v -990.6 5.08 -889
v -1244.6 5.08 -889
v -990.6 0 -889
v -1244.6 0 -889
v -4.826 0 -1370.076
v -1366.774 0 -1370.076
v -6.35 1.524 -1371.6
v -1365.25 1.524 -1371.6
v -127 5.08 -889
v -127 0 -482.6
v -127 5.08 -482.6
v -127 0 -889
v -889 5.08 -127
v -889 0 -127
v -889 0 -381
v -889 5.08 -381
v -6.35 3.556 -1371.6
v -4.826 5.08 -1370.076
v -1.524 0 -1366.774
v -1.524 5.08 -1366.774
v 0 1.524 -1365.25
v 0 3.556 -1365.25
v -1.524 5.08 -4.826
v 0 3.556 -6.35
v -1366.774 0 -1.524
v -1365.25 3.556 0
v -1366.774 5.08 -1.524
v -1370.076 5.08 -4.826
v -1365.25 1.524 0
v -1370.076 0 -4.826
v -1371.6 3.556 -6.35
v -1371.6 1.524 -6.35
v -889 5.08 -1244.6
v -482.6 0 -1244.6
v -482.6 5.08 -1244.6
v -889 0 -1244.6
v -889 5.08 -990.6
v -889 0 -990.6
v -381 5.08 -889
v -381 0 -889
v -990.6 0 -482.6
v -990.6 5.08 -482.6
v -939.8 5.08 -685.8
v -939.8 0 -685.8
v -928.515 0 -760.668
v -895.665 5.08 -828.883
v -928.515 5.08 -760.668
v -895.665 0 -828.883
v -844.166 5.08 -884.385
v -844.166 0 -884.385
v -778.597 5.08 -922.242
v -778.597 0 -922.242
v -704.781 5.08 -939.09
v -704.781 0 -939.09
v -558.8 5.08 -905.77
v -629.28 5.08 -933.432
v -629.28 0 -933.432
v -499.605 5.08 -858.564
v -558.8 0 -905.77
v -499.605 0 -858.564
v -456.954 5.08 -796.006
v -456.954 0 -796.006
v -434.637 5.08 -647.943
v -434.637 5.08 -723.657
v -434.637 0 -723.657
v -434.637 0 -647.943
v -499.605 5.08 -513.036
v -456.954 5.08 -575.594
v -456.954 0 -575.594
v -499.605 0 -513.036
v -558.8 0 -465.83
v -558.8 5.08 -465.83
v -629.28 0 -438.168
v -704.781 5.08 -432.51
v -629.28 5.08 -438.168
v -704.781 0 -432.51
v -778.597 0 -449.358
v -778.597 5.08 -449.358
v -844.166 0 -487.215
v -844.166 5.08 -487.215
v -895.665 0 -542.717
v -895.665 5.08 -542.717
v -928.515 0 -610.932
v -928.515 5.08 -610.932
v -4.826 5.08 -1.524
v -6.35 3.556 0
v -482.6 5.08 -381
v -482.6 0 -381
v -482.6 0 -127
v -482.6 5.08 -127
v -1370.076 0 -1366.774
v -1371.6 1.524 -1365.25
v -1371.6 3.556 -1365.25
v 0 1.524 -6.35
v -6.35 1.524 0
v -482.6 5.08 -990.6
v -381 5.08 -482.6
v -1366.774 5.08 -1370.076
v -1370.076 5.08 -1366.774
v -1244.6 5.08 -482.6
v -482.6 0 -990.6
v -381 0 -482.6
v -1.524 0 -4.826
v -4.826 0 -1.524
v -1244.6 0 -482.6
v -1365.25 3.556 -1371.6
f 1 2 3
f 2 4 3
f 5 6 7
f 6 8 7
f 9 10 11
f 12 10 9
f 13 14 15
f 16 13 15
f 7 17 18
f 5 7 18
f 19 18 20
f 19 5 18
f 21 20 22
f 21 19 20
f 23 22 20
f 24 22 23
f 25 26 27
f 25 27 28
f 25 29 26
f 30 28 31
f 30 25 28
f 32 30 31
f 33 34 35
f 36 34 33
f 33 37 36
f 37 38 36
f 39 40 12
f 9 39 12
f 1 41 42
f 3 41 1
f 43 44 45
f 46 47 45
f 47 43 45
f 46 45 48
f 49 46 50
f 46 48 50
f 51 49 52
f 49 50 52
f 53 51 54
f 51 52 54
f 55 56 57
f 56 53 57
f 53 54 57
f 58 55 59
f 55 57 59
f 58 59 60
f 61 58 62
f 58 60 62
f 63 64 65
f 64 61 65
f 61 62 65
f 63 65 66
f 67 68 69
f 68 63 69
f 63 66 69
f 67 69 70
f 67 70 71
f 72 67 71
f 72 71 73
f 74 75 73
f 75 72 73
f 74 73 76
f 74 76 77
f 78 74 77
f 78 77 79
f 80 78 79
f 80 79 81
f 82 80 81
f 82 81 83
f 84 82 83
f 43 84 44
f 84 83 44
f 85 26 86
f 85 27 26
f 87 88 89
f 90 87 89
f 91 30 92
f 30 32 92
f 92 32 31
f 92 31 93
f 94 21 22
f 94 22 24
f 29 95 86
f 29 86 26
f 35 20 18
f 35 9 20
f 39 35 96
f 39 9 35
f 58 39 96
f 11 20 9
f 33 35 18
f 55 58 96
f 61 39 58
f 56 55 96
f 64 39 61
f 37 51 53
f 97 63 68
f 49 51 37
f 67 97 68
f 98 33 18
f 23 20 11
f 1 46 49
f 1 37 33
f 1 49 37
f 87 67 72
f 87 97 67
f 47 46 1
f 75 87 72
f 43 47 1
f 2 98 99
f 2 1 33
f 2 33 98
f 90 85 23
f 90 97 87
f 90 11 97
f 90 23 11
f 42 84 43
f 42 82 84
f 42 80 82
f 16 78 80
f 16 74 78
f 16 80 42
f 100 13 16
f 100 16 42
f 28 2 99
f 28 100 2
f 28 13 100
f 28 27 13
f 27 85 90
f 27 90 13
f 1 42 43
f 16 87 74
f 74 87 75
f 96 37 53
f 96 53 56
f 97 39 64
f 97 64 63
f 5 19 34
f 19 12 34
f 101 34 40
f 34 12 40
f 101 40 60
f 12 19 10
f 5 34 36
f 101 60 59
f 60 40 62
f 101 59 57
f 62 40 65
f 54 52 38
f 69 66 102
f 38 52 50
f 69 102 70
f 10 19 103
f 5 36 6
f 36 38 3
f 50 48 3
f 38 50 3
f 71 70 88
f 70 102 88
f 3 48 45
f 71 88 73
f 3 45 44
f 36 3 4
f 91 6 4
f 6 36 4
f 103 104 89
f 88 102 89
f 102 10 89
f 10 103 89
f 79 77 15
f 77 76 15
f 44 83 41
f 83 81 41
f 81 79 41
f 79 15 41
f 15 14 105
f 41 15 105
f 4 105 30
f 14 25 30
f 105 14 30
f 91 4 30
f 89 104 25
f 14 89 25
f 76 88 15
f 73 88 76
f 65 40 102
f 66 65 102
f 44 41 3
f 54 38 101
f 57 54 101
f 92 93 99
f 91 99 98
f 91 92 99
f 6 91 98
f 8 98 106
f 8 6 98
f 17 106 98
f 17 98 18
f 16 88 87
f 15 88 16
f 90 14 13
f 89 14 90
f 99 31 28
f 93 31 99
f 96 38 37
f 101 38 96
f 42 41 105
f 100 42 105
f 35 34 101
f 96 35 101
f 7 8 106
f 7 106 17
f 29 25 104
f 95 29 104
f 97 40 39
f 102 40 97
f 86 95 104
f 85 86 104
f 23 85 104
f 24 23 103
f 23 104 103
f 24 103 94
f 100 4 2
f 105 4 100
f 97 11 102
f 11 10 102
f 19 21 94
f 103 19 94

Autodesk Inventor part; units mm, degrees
ref_plane "YZ Plane" through (0, 0, 0) normal (1, 0, 0) x (0, 1, 0)
ref_plane "XZ Plane" through (0, 0, 0) normal (0, 1, 0) x (-1, 0, 0)
ref_plane "XY Plane" through (0, 0, 0) normal (0, 0, 1) x (1, 0, 0)
sketch "Sketch1" plane through (0, 0, 0) normal (0, 1, 0) x (-1, 0, 0)
  line L0 (6.35, 0) -> (1365.25, 0)
  line L1 (1371.6, -6.35) -> (1371.6, -1365.25)
  line L2 (1365.25, -1371.6) -> (6.35, -1371.6)
  line L3 (0, -1365.25) -> (0, -6.35)
  line L4 (1346.2, -1346.2) -> (1346.2, -25.4)
  line L5 (1346.2, -25.4) -> (25.4, -25.4)
  line L6 (25.4, -25.4) -> (25.4, -1346.2)
  line L7 (25.4, -1346.2) -> (1346.2, -1346.2)
  line L8 (1320.8, -50.8) -> (1320.8, -1320.8)
  line L9 (1320.8, -1320.8) -> (50.8, -1320.8)
  line L10 (50.8, -1320.8) -> (50.8, -50.8)
  line L11 (50.8, -50.8) -> (1320.8, -50.8)
  line L12 (1320.8, -50.8) -> (1346.2, -25.4)
  line L13 (1320.8, -1320.8) -> (1346.2, -1346.2)
  line L14 (50.8, -1320.8) -> (25.4, -1346.2)
  line L15 (50.8, -50.8) -> (25.4, -25.4)
  line L16 (1219.2, -482.6) -> (1016, -482.6)
  line L17 (1016, -482.6) -> (1016, -889)
  line L18 (1016, -889) -> (1219.2, -889)
  line L19 (1219.2, -889) -> (1219.2, -482.6)
  line L20 (355.6, -482.6) -> (152.4, -482.6)
  line L21 (152.4, -482.6) -> (152.4, -889)
  line L22 (152.4, -889) -> (355.6, -889)
  line L23 (355.6, -889) -> (355.6, -482.6)
  line L24 (889, -1016) -> (482.6, -1016)
  line L25 (482.6, -1016) -> (482.6, -1219.2)
  line L26 (482.6, -1219.2) -> (889, -1219.2)
  line L27 (889, -1219.2) -> (889, -1016)
  line L28 (889, -152.4) -> (482.6, -152.4)
  line L29 (482.6, -152.4) -> (482.6, -355.6)
  line L30 (482.6, -355.6) -> (889, -355.6)
  line L31 (889, -355.6) -> (889, -152.4)
  circle A0 centre (685.8, -685.8) radius 254
  line L32 (889, -127) -> (482.6, -127)
  line L33 (457.2, -127) -> (457.2, -381)
  line L34 (457.2, -381) -> (914.4, -381)
  line L35 (914.4, -381) -> (914.4, -127)
  line L36 (1244.6, -457.2) -> (990.6, -457.2)
  line L37 (990.6, -457.2) -> (990.6, -914.4)
  line L38 (990.6, -914.4) -> (1244.6, -914.4)
  line L39 (1244.6, -889) -> (1244.6, -482.6)
  line L40 (914.4, -990.6) -> (457.2, -990.6)
  line L41 (457.2, -990.6) -> (457.2, -1244.6)
  line L42 (482.6, -1244.6) -> (889, -1244.6)
  line L43 (914.4, -1244.6) -> (914.4, -990.6)
  line L44 (381, -457.2) -> (127, -457.2)
  line L45 (127, -482.6) -> (127, -889)
  line L46 (127, -914.4) -> (381, -914.4)
  line L47 (381, -914.4) -> (381, -457.2)
  line L48 (152.4, -482.6) -> (50.8, -482.6)
  line L49 (127, -457.2) -> (50.8, -457.2)
  line L50 (152.4, -889) -> (50.8, -889)
  line L51 (127, -914.4) -> (50.8, -914.4)
  line L52 (355.6, -889) -> (381, -889)
  line L53 (355.6, -482.6) -> (381, -482.6)
  line L54 (457.2, -1244.6) -> (457.2, -1320.8)
  line L55 (482.6, -1219.2) -> (482.6, -1320.8)
  line L56 (889, -1219.2) -> (889, -1320.8)
  line L57 (914.4, -1244.6) -> (914.4, -1320.8)
  line L58 (1244.6, -914.4) -> (1320.8, -914.4)
  line L59 (1219.2, -889) -> (1320.8, -889)
  line L60 (1219.2, -482.6) -> (1320.8, -482.6)
  line L61 (1244.6, -457.2) -> (1320.8, -457.2)
  line L62 (889, -152.4) -> (889, -50.8)
  line L63 (914.4, -127) -> (914.4, -50.8)
  line L64 (482.6, -152.4) -> (482.6, -50.8)
  line L65 (457.2, -127) -> (457.2, -50.8)
  line L66 (889, -1016) -> (889, -990.6)
  line L67 (482.6, -1016) -> (482.6, -990.6)
  line L68 (1016, -889) -> (990.6, -889)
  line L69 (1016, -482.6) -> (990.6, -482.6)
  line L70 (889, -355.6) -> (889, -381)
  line L71 (482.6, -355.6) -> (482.6, -381)
  line L72 (914.4, -381) -> (990.6, -457.2)
  line L73 (990.6, -482.6) -> (889, -381)
  line L74 (990.6, -914.4) -> (914.4, -990.6)
  line L75 (889, -990.6) -> (990.6, -889)
  line L76 (381, -914.4) -> (457.2, -990.6)
  line L77 (482.6, -990.6) -> (381, -889)
  line L78 (457.2, -381) -> (381, -457.2)
  line L79 (482.6, -381) -> (381, -482.6)
  line L80 (1257.3, -50.8) -> (1320.8, -114.3)
  line L81 (1320.8, -1257.3) -> (1257.3, -1320.8)
  line L82 (50.8, -1257.3) -> (114.3, -1320.8)
  line L83 (50.8, -114.3) -> (114.3, -50.8)
  line L84 (68.7605, -132.2605) -> (132.2605, -68.7605)
  line L85 (68.7605, -1239.3395) -> (132.2605, -1302.8395)
  line L86 (1302.8395, -1239.3395) -> (1239.3395, -1302.8395)
  line L87 (1239.3395, -68.7605) -> (1302.8395, -132.2605)
  line L88 (1302.8395, -132.2605) -> (1320.8, -150.221)
  line L89 (1239.3395, -68.7605) -> (1221.379, -50.8)
  line L90 (1302.8395, -1239.3395) -> (1320.8, -1221.379)
  line L91 (1239.3395, -1302.8395) -> (1221.379, -1320.8)
  line L92 (132.2605, -1302.8395) -> (150.221, -1320.8)
  line L93 (68.7605, -1239.3395) -> (50.8, -1221.379)
  line L94 (132.2605, -68.7605) -> (150.221, -50.8)
  line L95 (68.7605, -132.2605) -> (50.8, -150.221)
  line L96 (1365.25, 0) -> (1371.6, -6.35)
  line L97 (1371.6, -1365.25) -> (1365.25, -1371.6)
  line L98 (6.35, -1371.6) -> (0, -1365.25)
  line L99 (6.35, 0) -> (0, -6.35)
  point P0 (0, 0)
  point P1 (1371.6, -1371.6)
  point P2 (1371.6, 0)
  point P3 (0, -1371.6)
  dimension "d0" = 1371.6
  dimension "d1" = 1371.6
  dimension "d2" = 25.4
  dimension "d3" = 25.4
  dimension "d4" = 203.2
  dimension "d5" = 406.4
  dimension "d6" = 203.2
  dimension "d7" = 406.4
  dimension "d8" = 406.4
  dimension "d9" = 203.2
  dimension "d10" = 406.4
  dimension "d11" = 203.2
  dimension "d12" = 101.6
  dimension "d13" = 101.6
  dimension "d14" = 101.6
  dimension "d15" = 101.6
  dimension "d16" = 431.8
  dimension "d17" = 431.8
  dimension "d18" = 431.8
  dimension "d19" = 431.8
  dimension "d20" = 508
  dimension "d21" = 25.4
  dimension "d22" = 25.4
  dimension "d23" = 25.4
  dimension "d24" = 25.4
  dimension "d25" = 45
  dimension "d26" = 63.5
  dimension "d27" = 45
  dimension "d28" = 45
  dimension "d29" = 45
  dimension "d30" = 25.4
  dimension "d31" = 25.4
  dimension "d32" = 25.4
  dimension "d33" = 25.4
  dimension "d34" = 6.35
  dimension "d35" = 6.35
  dimension "d36" = 6.35
  dimension "d37" = 6.35
  dimension "d38" = 6.35
  dimension "d39" = 6.35
  dimension "d40" = 6.35
  dimension "d41" = 6.35
extrude "Extrusion1" add sketch "Sketch1" along normal blind 5.08 contours L0 L96 L1 L97 L2 L98 L3 L99 | L13 L8 L12 L4 | L7 L14 L9 L13 | L12 L11 L15 L5 | L6 L15 L10 L14 | L9 L81 L8 | L8 L80 L11 | L10 L82 L9 | L81 L9 L91 L86 L90 L8 | L11 L83 L10 | L8 L88 L87 L89 L11 L80 | L82 L10 L93 L85 L92 L9 | L90 L86 L91 L9 L57 L43 L74 L38 L58 L8 | L83 L11 L94 L84 L95 L10 | L8 L61 L36 L72 L35 L63 L11 L89 L87 L88 | L92 L85 L93 L10 L51 L46 L76 L41 L54 L9 | L58 L38 L37 L68 L18 L59 L8 | L9 L56 L27 L66 L40 L43 L57 | L95 L84 L94 L11 L65 L33 L78 L44 L49 L10 | L8 L60 L16 L69 L37 L36 L61 | L63 L35 L34 L70 L31 L62 L11 | L54 L41 L40 L67 L25 L55 L9 | L10 L50 L22 L52 L47 L46 L51 | L59 L39 L60 L8 | L9 L55 L42 L56 | L49 L44 L47 L53 L20 L48 L10 | L11 L64 L29 L71 L34 L33 L65 | L62 L32 L64 L11 | L10 L48 L45 L50 | L74 L40 L75 L37 | L37 L73 L34 L72 | L76 L47 L77 L40 | L75 L40 L77 L47 L79 L34 L73 L37 | L78 L34 L79 L47
chamfer "Chamfer1" distance 1.524 angle 45 8 edges at (-1371.6, 5.08, -685.8) (-1371.6, 0, -685.8) (-685.8, 5.08, 0) (-685.8, 0, 0) (-685.8, 5.08, -1371.6) (-685.8, 0, -1371.6) (0, 5.08, -685.8) (0, 0, -685.8)
equation "\"d35\" = d34"
equation "\"d36\" = d34"
equation "\"d37\" = d36"
equation "\"d38\" = d34"
equation "\"d39\" = d38"
equation "\"d40\" = d34"
equation "\"d41\" = d40"
properties part number "Glass top X1" material "Glass"
